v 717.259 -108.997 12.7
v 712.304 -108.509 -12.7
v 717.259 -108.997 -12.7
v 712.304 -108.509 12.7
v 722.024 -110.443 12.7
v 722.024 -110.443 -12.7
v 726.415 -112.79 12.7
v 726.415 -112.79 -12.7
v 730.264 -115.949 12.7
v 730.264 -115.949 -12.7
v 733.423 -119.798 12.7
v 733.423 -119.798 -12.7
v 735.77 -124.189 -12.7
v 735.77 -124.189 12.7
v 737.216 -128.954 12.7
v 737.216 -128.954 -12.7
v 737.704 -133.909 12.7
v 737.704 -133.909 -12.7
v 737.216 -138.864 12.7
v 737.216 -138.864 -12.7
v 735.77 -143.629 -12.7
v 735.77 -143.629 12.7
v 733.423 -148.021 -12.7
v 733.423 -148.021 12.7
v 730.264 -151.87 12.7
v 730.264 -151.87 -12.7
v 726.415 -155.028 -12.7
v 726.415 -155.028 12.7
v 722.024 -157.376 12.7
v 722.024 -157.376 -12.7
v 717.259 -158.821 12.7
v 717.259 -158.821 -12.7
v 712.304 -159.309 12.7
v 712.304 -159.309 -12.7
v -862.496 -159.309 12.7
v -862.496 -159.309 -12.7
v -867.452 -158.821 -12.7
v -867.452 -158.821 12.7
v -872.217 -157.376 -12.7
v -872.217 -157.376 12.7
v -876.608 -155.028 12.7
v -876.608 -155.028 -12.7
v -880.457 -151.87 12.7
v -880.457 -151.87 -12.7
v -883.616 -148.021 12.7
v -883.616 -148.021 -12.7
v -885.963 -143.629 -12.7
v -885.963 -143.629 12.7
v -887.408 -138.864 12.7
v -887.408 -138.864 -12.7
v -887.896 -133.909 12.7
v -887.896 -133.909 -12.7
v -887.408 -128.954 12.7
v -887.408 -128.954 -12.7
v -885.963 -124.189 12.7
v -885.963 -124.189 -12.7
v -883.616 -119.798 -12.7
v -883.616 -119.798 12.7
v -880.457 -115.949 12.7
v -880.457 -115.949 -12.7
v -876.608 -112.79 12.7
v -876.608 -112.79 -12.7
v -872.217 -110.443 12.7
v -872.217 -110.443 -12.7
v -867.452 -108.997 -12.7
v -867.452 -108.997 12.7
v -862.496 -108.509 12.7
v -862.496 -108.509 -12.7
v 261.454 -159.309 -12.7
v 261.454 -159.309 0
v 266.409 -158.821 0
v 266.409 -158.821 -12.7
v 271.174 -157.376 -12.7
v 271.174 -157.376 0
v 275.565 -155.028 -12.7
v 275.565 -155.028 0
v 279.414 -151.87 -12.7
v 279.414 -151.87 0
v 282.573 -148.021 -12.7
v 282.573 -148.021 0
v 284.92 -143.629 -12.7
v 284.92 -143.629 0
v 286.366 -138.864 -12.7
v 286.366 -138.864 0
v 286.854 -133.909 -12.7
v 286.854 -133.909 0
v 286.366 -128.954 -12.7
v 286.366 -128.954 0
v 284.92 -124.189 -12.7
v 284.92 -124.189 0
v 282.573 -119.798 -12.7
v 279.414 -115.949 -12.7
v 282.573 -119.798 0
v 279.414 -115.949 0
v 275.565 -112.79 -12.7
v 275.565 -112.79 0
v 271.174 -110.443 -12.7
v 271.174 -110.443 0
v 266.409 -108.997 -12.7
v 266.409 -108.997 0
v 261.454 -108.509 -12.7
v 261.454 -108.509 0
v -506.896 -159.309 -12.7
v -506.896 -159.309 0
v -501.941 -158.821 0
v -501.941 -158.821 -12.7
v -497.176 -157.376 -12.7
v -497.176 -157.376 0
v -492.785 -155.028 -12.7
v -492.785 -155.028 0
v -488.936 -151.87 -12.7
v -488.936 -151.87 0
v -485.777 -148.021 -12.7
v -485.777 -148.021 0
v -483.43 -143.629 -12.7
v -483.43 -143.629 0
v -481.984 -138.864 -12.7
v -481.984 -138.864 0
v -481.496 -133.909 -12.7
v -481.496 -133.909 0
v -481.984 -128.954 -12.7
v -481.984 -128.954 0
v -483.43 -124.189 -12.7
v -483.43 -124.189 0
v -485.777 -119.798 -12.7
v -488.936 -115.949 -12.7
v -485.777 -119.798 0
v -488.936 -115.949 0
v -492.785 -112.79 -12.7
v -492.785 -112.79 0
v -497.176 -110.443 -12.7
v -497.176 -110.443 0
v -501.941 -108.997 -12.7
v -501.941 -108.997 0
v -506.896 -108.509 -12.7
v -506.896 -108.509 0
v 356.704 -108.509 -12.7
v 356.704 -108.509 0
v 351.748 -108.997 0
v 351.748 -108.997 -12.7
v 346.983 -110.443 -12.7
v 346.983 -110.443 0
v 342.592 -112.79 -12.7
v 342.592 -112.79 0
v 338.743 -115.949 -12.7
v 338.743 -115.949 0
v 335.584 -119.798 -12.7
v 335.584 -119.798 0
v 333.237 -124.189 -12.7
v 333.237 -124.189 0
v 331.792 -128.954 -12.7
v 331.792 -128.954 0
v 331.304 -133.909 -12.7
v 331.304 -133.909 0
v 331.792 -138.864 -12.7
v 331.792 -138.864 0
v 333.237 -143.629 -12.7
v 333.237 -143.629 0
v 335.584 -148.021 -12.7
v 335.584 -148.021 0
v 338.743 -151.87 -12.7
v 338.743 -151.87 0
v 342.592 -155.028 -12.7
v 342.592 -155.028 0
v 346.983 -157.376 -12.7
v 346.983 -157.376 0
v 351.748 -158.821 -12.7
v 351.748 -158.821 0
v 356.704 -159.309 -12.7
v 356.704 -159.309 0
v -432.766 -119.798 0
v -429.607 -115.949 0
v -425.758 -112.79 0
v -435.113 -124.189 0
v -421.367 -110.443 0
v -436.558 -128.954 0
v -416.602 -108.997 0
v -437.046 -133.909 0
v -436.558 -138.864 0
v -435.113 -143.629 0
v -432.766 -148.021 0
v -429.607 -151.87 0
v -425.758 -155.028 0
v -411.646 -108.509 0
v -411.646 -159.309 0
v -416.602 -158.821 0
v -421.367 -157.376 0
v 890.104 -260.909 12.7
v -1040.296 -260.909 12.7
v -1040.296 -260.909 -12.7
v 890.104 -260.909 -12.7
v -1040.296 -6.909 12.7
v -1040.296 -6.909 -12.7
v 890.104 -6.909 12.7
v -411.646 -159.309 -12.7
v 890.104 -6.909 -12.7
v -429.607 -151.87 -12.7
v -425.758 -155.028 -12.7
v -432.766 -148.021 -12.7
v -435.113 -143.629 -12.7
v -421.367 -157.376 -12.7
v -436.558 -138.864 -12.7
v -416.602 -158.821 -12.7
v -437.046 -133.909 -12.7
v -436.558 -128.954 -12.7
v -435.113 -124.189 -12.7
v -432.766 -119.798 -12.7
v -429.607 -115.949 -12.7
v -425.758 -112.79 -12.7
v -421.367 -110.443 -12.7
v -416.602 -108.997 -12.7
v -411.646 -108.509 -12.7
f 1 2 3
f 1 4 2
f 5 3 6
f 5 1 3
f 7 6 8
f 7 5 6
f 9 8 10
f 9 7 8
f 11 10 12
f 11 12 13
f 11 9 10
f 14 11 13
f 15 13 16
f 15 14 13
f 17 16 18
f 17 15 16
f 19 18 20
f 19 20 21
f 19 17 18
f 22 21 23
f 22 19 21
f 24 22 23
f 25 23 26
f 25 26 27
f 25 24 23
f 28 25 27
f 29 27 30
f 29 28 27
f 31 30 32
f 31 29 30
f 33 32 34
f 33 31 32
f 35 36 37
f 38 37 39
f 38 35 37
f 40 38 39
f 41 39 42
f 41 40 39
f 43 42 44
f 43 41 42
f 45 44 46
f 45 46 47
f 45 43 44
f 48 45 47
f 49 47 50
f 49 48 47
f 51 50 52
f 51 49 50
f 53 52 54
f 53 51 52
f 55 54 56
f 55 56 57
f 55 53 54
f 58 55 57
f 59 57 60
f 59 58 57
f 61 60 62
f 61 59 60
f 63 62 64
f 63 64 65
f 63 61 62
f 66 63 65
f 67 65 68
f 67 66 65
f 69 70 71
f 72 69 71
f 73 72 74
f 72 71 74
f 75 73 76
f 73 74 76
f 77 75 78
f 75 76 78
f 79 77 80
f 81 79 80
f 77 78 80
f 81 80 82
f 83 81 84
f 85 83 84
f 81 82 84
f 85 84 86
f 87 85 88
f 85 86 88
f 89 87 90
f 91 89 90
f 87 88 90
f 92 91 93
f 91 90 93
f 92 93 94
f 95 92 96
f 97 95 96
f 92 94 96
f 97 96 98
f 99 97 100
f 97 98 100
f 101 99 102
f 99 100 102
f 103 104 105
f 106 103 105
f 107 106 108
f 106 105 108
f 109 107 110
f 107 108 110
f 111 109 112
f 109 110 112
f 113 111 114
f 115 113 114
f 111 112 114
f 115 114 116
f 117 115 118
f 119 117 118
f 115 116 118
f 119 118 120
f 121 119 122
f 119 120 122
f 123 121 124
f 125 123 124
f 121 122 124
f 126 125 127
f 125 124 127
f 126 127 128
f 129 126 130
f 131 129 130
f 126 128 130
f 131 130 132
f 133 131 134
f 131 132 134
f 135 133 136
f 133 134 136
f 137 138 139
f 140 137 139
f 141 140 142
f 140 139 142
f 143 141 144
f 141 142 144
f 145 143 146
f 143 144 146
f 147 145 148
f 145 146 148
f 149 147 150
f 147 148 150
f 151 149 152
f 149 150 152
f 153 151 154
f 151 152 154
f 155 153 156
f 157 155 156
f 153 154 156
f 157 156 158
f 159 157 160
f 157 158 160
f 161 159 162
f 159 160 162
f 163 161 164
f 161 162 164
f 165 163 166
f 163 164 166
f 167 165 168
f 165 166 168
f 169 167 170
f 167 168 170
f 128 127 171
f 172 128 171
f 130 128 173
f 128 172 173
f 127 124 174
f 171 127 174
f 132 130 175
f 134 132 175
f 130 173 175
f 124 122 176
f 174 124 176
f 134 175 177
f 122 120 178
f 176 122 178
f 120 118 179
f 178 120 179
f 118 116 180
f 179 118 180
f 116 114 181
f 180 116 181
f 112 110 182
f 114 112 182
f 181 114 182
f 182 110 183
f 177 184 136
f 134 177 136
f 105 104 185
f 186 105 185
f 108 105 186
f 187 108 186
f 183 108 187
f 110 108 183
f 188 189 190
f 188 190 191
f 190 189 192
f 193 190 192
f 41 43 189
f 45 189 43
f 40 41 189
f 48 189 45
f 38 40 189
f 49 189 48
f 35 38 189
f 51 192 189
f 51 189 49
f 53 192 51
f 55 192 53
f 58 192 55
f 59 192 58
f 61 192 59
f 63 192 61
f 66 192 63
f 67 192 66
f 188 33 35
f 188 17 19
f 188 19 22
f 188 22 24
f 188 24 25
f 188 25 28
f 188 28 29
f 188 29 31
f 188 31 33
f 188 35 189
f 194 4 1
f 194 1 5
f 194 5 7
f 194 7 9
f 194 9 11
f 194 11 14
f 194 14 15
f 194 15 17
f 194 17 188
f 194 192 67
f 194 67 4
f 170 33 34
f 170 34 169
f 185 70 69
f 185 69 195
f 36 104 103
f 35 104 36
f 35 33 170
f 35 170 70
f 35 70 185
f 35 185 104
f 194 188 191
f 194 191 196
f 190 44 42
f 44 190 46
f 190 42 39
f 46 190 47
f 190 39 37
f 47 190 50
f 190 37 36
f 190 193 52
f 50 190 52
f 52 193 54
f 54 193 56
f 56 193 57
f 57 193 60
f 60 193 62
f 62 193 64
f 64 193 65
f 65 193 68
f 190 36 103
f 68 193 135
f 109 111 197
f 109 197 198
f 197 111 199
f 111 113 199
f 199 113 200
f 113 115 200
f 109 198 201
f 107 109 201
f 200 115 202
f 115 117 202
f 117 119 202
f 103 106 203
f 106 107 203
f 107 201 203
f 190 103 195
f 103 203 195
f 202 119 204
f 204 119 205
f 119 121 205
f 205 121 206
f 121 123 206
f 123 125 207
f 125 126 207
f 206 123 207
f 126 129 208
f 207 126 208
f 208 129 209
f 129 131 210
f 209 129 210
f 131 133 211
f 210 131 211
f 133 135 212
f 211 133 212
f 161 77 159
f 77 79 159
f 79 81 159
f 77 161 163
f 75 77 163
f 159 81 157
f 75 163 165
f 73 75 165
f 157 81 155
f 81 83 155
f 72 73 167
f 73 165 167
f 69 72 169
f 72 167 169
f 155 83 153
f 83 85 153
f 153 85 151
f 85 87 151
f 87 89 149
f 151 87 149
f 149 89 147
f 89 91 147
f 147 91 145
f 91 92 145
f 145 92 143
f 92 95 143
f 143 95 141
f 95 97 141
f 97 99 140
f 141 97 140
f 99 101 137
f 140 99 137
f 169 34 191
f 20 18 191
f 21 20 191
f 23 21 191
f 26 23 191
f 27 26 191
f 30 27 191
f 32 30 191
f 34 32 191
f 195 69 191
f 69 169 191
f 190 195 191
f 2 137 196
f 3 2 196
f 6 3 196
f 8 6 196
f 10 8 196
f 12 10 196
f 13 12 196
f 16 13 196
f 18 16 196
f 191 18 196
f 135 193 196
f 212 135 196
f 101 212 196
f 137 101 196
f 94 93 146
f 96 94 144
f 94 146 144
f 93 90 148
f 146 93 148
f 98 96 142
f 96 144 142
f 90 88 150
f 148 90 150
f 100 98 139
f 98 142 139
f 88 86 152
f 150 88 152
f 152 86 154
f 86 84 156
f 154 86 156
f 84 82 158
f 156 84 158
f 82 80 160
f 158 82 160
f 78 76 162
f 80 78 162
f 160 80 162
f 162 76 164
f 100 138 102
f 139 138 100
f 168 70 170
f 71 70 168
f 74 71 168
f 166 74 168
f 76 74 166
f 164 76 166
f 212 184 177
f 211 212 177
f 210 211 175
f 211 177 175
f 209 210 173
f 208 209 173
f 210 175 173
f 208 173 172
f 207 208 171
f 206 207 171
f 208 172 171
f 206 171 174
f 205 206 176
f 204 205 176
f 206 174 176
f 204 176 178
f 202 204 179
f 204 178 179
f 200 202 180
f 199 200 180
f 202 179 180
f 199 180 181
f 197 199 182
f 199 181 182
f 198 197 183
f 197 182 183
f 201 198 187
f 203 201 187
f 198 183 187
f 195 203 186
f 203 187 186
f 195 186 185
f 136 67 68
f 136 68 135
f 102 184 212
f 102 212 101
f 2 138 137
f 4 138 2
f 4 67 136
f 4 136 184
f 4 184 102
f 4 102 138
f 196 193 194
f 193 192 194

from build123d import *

# Parameters (mm, degrees)
F0_W     = 1930.4
F0_H     = 254
F1_DEPTH = 12.7
F3_DEPTH = 12.7


# Not quite as in the source:
# - ends of sketch curves that miss each other by under 0.0002 mm in the source are joined
# - a feature names something its author has since deleted; it is built from what else it names


with BuildPart() as f1:
    # F0 (on Top) → F1 (new body)
    with BuildSketch(Plane.XY):
        with Locations((-75.096349721, -133.9091630952)):
            Rectangle(F0_W, F0_H)
        with BuildLine():
            ThreePointArc((-862.496349721, -159.3091630952), (-887.896349721, -133.9091630952), (-862.496349721, -108.5091630952))
            Line((-862.496349721, -108.5091630952), (712.303650279, -108.5091630952))
            ThreePointArc((712.303650279, -108.5091630952), (737.703650279, -133.9091630952), (712.303650279, -159.3091630952))
            Line((712.303650279, -159.3091630952), (-862.496349721, -159.3091630952))
        make_face(mode=Mode.SUBTRACT)
    extrude(amount=F1_DEPTH)

    # F2 (on face) + F0 (on Top) → F3 (join)
    with BuildSketch(Plane(origin=(0, 0, 0), x_dir=(1, 0, 0), z_dir=(0, 0, -1))):
        with BuildLine():
            ThreePointArc((-506.896349721, 159.3091630952), (-481.496349721, 133.9091630952), (-506.896349721, 108.5091630952))
            Line((-506.896349721, 108.5091630952), (-411.646349721, 108.5091630952))
            ThreePointArc((-411.646349721, 108.5091630952), (-437.046349721, 133.9091630952), (-411.646349721, 159.3091630952))
            Line((-411.646349721, 159.3091630952), (-506.896349721, 159.3091630952))
        make_face()
        with BuildLine():
            ThreePointArc((261.453650279, 159.3091630952), (286.853650279, 133.9091630952), (261.453650279, 108.5091630952))
            Line((261.453650279, 108.5091630952), (356.703650279, 108.5091630952))
            ThreePointArc((356.703650279, 108.5091630952), (331.303650279, 133.9091630952), (356.703650279, 159.3091630952))
            Line((356.703650279, 159.3091630952), (261.453650279, 159.3091630952))
        make_face()
    with BuildSketch(Plane.XY):
        with Locations((-75.096349721, -133.9091630952)):
            Rectangle(F0_W, F0_H)
        with BuildLine():
            ThreePointArc((-862.496349721, -159.3091630952), (-887.896349721, -133.9091630952), (-862.496349721, -108.5091630952))
            Line((-862.496349721, -108.5091630952), (712.303650279, -108.5091630952))
            ThreePointArc((712.303650279, -108.5091630952), (737.703650279, -133.9091630952), (712.303650279, -159.3091630952))
            Line((712.303650279, -159.3091630952), (-862.496349721, -159.3091630952))
        make_face(mode=Mode.SUBTRACT)
    extrude(amount=F3_DEPTH, dir=(0, 0, -1))


solid = f1.part
